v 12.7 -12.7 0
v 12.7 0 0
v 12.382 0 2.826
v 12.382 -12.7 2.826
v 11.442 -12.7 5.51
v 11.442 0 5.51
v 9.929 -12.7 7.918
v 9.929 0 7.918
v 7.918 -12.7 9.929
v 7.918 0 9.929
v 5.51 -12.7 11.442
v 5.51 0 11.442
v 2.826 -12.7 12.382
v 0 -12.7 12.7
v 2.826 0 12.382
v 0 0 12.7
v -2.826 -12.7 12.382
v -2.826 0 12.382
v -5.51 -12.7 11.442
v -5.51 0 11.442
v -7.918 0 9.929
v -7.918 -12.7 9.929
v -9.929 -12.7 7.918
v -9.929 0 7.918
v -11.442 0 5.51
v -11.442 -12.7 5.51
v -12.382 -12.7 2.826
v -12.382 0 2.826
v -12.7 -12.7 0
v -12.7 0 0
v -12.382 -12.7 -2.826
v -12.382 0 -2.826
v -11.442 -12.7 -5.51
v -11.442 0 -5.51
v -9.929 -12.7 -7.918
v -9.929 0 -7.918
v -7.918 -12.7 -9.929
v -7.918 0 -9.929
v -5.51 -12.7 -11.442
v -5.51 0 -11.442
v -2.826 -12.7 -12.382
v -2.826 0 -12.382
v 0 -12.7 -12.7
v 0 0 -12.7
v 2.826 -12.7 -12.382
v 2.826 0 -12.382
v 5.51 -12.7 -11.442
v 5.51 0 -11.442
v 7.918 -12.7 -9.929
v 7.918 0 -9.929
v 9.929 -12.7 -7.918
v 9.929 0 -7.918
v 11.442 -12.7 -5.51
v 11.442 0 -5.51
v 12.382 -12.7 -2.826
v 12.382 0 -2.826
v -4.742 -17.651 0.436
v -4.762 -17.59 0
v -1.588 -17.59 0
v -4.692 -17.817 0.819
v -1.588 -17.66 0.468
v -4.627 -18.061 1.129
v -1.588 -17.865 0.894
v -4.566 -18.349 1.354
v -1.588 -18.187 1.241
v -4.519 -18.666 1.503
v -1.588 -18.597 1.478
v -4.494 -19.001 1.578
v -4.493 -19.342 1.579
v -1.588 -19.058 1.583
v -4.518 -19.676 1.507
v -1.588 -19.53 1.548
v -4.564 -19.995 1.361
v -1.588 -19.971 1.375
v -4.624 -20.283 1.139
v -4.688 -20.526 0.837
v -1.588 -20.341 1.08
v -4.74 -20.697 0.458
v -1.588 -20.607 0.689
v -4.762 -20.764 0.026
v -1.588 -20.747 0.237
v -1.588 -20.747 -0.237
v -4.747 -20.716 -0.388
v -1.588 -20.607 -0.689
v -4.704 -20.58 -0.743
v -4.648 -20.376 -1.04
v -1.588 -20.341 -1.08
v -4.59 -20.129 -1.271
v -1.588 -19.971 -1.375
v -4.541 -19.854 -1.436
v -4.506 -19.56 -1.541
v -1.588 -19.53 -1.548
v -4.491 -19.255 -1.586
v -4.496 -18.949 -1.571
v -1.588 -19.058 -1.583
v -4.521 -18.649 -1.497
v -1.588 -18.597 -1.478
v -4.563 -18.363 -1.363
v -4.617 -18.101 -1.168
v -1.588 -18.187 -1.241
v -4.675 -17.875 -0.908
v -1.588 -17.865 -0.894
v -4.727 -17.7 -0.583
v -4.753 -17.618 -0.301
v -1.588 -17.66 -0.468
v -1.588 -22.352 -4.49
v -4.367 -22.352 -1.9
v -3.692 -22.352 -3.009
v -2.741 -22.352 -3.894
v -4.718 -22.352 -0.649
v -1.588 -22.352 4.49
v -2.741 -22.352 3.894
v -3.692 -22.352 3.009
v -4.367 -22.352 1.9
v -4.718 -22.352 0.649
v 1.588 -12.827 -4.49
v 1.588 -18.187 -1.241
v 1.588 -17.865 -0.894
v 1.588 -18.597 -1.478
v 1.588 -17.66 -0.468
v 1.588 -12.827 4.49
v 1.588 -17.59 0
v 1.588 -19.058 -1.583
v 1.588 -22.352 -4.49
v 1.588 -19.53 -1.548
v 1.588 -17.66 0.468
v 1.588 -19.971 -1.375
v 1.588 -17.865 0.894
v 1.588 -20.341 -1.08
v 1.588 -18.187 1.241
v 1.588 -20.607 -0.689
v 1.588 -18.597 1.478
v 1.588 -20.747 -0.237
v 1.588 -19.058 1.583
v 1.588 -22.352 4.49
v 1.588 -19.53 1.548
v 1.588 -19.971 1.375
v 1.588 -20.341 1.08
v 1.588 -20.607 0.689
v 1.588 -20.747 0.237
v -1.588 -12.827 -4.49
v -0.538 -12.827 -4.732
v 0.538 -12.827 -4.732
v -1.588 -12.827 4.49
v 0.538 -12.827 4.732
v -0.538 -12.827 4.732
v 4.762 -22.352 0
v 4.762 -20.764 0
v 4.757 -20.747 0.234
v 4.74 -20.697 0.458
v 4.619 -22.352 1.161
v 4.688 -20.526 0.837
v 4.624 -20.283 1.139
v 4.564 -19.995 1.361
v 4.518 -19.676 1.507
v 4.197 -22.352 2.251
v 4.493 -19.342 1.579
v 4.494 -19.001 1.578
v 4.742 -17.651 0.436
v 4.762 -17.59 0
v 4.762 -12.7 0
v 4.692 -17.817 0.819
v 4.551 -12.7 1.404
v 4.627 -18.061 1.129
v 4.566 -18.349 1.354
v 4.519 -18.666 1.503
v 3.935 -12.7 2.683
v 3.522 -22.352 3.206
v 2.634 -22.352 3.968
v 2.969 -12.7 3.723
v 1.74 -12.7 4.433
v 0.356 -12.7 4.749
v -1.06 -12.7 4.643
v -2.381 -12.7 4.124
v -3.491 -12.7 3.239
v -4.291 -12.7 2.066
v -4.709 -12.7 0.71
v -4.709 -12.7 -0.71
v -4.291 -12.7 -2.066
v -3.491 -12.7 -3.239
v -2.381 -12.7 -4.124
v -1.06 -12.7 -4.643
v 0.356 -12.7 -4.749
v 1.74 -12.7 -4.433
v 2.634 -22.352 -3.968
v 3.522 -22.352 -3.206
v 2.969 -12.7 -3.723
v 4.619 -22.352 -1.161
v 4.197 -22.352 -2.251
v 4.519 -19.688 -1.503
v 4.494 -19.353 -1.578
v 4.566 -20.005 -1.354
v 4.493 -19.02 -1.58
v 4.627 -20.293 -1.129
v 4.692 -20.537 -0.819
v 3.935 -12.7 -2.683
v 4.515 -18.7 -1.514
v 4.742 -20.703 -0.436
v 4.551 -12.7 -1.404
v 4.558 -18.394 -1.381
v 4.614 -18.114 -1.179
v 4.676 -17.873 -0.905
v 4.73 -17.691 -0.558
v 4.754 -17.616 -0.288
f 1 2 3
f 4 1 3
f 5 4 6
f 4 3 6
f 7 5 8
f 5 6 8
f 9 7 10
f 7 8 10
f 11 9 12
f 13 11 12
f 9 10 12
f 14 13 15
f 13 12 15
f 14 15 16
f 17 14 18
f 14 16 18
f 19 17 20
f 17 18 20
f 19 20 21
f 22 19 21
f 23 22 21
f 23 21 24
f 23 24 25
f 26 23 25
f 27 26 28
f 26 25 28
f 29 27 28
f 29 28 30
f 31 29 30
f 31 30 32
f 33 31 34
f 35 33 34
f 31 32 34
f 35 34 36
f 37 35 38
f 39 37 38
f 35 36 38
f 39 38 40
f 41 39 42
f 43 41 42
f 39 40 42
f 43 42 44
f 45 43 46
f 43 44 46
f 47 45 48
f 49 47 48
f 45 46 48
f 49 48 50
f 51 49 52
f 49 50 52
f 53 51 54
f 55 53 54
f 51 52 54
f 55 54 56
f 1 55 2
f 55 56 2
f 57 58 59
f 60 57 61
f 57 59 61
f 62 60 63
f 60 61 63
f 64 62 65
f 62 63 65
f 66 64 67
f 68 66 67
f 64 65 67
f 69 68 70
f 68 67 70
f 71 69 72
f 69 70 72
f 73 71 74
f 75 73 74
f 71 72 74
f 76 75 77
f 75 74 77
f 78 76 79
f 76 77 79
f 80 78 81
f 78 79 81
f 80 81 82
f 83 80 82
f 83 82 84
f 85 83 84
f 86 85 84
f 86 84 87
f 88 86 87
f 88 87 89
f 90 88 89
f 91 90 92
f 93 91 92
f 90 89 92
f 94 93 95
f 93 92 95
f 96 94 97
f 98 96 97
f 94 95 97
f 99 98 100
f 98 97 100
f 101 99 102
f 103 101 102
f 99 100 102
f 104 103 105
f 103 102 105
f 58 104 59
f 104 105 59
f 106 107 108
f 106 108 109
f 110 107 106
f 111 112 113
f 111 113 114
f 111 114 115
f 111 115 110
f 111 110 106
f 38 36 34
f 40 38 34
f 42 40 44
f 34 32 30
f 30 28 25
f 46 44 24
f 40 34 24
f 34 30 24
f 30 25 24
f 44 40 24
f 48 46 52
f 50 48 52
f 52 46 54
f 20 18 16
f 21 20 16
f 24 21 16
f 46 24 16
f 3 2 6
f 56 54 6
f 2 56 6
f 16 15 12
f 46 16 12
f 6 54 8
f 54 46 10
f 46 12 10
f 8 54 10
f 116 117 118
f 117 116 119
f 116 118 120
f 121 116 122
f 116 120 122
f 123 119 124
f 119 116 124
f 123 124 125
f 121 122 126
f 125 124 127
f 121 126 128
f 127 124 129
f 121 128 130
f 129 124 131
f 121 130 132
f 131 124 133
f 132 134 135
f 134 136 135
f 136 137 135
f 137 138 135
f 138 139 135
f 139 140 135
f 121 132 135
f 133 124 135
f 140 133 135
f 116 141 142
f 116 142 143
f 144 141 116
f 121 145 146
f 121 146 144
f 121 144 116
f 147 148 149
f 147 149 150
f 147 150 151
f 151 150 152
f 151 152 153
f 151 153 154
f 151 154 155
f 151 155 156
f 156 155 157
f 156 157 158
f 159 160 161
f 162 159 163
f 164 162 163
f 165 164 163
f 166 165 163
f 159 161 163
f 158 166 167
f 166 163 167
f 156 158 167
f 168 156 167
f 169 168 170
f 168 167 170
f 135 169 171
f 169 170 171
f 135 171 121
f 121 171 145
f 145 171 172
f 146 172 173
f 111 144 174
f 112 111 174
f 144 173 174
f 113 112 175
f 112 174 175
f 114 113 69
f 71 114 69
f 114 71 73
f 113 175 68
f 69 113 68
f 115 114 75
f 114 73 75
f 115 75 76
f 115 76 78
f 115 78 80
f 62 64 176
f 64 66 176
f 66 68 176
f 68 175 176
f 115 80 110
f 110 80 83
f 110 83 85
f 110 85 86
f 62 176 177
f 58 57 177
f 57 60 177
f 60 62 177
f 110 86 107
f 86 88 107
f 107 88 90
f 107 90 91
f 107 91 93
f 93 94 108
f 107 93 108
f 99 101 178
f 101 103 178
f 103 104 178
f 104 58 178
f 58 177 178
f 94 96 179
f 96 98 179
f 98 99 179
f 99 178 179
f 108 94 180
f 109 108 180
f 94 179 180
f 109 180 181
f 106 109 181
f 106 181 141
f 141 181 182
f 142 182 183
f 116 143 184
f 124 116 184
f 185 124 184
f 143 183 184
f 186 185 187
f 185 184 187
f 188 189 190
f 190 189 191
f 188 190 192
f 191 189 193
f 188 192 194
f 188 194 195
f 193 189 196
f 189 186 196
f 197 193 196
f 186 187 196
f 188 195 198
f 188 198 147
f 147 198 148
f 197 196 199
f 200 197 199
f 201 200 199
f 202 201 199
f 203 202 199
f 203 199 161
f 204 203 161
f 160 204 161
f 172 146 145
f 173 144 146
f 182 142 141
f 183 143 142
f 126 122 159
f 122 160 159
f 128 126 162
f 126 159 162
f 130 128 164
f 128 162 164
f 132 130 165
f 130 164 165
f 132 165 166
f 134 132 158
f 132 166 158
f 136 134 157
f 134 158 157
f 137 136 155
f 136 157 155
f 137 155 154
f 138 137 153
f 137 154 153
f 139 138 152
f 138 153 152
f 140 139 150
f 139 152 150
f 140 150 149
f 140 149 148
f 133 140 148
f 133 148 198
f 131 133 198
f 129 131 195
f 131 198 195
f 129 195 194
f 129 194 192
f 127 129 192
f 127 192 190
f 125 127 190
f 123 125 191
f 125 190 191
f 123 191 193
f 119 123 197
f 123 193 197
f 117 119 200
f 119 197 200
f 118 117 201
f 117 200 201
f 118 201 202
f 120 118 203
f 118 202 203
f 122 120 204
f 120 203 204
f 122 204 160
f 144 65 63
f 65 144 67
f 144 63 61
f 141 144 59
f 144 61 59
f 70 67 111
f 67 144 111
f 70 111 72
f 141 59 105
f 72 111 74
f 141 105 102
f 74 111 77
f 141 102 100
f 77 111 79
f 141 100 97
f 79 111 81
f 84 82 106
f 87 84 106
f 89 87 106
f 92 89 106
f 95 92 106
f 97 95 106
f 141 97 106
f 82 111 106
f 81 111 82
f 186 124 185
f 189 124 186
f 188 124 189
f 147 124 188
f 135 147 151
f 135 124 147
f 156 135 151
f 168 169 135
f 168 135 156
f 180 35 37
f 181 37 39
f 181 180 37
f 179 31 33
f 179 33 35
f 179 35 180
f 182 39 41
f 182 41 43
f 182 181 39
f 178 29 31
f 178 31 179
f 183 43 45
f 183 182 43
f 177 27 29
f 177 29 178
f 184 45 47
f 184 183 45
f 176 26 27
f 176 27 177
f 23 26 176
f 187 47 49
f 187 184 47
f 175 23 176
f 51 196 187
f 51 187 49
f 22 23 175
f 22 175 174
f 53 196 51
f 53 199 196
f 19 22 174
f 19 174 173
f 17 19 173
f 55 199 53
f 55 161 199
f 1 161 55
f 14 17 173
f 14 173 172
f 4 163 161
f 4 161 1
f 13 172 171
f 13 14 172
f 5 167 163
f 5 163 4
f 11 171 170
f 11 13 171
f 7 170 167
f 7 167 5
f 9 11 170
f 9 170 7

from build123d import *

# Parameters (mm, degrees)
F0_R     = 12.7
F1_DEPTH = 12.7
F2_R     = 4.7625
F3_DEPTH = 9.652
F5_DEPTH = 9.525
F6_R     = 1.5875
F7_DEPTH = 6.35


with BuildPart() as f1:
    # F0 (on Front) → F1 (new body)
    with BuildSketch(Plane.XZ):
        Circle(F0_R)
    extrude(amount=F1_DEPTH)

    # F2 (on face) → F3 (join)
    with BuildSketch(Plane.XZ.offset(12.7)):
        Circle(F2_R)
    extrude(amount=F3_DEPTH)

    # F4 (on face) → F5 (cut)
    with BuildSketch(Plane.XZ.offset(22.352)):
        with BuildLine():
            ThreePointArc((1.5875, 4.490128), (0, 4.7625), (-1.5875, 4.490128))
            Line((-1.5875, 4.490128), (-1.5875, -4.490128))
            ThreePointArc((-1.5875, -4.490128), (0, -4.7625), (1.5875, -4.490128))
            Line((1.5875, -4.490128), (1.5875, 4.490128))
        make_face()
    extrude(amount=-F5_DEPTH, mode=Mode.SUBTRACT)

    # F6 (on face) → F7 (cut, symmetric)
    with BuildSketch(Plane.YZ.offset(-1.5875)):
        with Locations((-19.177, 0)):
            Circle(F6_R)
    extrude(amount=F7_DEPTH, both=True, mode=Mode.SUBTRACT)


solid = f1.part
